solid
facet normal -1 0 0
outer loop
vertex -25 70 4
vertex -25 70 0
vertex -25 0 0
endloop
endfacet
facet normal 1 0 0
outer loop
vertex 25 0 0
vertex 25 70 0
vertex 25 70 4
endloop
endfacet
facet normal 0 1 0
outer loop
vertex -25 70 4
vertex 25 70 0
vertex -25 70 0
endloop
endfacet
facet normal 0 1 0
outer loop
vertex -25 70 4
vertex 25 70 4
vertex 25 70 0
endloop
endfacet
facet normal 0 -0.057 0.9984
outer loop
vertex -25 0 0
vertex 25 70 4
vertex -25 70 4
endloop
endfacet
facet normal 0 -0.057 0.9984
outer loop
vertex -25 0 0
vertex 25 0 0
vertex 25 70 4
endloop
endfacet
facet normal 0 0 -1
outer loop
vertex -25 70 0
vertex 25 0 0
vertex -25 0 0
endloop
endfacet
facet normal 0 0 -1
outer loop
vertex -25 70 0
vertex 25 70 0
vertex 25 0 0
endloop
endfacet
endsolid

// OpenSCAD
// License:  Creative Commons Attribtion-NonCommercial-ShareAlike
// http://creativecommons.org/licenses/by-nc-sa/3.0/legalcode
//
// Author: Jetty, 1st November, 2011
//
//
// Heated Build Platform Wedge Removal Tool
//
// Print with 100% Fill

maxThickness  = -4;
length = 70;
width = 50;

rotate(a=[90, 90, 90])
{
	linear_extrude(height = width, center = true, convexity = 10, twist = 0)
		polygon(points=[ [0,0], [maxThickness, length], [0, length] ], paths=[[0,1,2]]);
}
